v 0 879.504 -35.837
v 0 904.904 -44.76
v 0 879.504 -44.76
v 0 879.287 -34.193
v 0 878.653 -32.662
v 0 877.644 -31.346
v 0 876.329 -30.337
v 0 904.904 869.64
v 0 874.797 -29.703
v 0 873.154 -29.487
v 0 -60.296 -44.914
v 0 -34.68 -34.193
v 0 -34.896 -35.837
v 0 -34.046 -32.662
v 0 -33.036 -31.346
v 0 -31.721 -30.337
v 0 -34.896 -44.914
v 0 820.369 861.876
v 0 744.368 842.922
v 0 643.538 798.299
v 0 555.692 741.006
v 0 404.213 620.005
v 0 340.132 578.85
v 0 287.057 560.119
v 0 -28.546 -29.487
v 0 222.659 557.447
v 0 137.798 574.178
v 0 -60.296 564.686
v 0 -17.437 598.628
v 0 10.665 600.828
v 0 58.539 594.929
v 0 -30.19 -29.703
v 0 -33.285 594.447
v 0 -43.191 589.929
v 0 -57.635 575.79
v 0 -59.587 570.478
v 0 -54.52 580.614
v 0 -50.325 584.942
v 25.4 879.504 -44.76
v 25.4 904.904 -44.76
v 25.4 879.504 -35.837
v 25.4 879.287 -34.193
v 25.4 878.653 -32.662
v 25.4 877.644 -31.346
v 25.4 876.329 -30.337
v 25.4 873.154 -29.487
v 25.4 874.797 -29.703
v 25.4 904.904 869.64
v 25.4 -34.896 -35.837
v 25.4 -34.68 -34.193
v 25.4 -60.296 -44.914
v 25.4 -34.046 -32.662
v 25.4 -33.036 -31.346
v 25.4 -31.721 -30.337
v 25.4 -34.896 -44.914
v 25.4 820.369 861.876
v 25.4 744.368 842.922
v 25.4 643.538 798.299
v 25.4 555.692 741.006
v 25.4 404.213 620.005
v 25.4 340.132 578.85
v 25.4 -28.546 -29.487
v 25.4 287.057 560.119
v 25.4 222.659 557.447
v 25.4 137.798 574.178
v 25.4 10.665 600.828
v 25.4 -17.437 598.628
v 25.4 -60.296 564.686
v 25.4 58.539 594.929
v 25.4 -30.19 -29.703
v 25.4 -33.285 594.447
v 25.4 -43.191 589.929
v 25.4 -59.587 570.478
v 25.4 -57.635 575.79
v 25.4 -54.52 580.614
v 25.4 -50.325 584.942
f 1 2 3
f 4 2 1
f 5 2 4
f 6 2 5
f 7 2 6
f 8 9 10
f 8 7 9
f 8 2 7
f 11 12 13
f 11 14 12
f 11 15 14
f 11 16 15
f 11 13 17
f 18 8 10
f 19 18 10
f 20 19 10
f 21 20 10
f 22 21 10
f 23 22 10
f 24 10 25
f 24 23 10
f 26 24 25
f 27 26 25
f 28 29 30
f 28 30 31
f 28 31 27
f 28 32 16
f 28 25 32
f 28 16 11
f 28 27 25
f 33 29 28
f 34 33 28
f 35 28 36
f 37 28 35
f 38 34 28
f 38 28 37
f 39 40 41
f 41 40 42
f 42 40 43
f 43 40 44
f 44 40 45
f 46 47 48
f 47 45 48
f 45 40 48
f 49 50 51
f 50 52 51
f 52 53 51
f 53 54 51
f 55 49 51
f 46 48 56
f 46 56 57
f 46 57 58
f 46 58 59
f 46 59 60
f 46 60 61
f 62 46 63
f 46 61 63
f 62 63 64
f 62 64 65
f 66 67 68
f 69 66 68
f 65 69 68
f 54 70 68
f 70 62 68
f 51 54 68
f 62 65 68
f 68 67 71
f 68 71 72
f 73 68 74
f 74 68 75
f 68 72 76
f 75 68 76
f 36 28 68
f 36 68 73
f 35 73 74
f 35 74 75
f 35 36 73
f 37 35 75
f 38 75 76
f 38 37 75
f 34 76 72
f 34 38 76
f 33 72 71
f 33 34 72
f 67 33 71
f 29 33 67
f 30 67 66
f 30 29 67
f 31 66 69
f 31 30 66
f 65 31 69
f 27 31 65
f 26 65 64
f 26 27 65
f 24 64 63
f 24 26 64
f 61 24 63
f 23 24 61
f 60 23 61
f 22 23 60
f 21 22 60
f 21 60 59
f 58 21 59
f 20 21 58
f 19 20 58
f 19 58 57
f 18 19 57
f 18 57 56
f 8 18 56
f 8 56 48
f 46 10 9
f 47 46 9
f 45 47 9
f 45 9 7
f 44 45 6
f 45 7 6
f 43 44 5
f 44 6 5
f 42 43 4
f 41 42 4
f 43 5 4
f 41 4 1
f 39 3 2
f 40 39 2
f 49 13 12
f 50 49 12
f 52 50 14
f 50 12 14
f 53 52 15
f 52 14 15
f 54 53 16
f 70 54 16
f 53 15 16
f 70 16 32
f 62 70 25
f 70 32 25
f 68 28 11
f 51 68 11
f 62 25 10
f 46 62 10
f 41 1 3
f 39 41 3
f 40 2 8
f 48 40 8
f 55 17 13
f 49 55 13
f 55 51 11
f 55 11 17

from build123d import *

# Parameters (mm, degrees)
F1_DEPTH = 25.4


with BuildPart() as f1:
    # F0 (on Right) → F1 (new body)
    with BuildSketch(Plane.YZ):
        with BuildLine():
            add(Edge.make_bspline(
                [(-60.2963551223, 564.6858811378), (-60.0320473313, 591.2725925446), (46.9638078803, 626.4810392378), (366.3967390835, 445.378562913), (592.6715987205, 864.8102179789), (904.9036448777, 869.6396498621)],
                knots=[0, 0, 0, 0, 0.1835317768, 0.5046537257, 1, 1, 1, 1], degree=3))
            Line((-60.2963551223, 564.6858811378), (-60.2963551223, -44.9141188622))
            Line((-60.2963551223, -44.9141188622), (-34.8963551223, -44.9141188622))
            Line((-34.8963551223, -44.9141188622), (-34.8963551223, -35.8365239412))
            ThreePointArc((-34.8963551223, -35.8365239412), (-33.0364831829, -31.3463958806), (-28.5463551223, -29.4865239412))
            Line((-28.5463551223, -29.4865239412), (873.1536448777, -29.4865239412))
            ThreePointArc((873.1536448777, -29.4865239412), (877.6437729382, -31.3463958806), (879.5036448777, -35.8365239412))
            Line((879.5036448777, -35.8365239412), (879.5036448777, -44.7603501379))
            Line((879.5036448777, -44.7603501379), (904.9036448777, -44.7603501379))
            Line((904.9036448777, -44.7603501379), (904.9036448777, 869.6396498621))
        make_face()
    extrude(amount=F1_DEPTH)


solid = f1.part
